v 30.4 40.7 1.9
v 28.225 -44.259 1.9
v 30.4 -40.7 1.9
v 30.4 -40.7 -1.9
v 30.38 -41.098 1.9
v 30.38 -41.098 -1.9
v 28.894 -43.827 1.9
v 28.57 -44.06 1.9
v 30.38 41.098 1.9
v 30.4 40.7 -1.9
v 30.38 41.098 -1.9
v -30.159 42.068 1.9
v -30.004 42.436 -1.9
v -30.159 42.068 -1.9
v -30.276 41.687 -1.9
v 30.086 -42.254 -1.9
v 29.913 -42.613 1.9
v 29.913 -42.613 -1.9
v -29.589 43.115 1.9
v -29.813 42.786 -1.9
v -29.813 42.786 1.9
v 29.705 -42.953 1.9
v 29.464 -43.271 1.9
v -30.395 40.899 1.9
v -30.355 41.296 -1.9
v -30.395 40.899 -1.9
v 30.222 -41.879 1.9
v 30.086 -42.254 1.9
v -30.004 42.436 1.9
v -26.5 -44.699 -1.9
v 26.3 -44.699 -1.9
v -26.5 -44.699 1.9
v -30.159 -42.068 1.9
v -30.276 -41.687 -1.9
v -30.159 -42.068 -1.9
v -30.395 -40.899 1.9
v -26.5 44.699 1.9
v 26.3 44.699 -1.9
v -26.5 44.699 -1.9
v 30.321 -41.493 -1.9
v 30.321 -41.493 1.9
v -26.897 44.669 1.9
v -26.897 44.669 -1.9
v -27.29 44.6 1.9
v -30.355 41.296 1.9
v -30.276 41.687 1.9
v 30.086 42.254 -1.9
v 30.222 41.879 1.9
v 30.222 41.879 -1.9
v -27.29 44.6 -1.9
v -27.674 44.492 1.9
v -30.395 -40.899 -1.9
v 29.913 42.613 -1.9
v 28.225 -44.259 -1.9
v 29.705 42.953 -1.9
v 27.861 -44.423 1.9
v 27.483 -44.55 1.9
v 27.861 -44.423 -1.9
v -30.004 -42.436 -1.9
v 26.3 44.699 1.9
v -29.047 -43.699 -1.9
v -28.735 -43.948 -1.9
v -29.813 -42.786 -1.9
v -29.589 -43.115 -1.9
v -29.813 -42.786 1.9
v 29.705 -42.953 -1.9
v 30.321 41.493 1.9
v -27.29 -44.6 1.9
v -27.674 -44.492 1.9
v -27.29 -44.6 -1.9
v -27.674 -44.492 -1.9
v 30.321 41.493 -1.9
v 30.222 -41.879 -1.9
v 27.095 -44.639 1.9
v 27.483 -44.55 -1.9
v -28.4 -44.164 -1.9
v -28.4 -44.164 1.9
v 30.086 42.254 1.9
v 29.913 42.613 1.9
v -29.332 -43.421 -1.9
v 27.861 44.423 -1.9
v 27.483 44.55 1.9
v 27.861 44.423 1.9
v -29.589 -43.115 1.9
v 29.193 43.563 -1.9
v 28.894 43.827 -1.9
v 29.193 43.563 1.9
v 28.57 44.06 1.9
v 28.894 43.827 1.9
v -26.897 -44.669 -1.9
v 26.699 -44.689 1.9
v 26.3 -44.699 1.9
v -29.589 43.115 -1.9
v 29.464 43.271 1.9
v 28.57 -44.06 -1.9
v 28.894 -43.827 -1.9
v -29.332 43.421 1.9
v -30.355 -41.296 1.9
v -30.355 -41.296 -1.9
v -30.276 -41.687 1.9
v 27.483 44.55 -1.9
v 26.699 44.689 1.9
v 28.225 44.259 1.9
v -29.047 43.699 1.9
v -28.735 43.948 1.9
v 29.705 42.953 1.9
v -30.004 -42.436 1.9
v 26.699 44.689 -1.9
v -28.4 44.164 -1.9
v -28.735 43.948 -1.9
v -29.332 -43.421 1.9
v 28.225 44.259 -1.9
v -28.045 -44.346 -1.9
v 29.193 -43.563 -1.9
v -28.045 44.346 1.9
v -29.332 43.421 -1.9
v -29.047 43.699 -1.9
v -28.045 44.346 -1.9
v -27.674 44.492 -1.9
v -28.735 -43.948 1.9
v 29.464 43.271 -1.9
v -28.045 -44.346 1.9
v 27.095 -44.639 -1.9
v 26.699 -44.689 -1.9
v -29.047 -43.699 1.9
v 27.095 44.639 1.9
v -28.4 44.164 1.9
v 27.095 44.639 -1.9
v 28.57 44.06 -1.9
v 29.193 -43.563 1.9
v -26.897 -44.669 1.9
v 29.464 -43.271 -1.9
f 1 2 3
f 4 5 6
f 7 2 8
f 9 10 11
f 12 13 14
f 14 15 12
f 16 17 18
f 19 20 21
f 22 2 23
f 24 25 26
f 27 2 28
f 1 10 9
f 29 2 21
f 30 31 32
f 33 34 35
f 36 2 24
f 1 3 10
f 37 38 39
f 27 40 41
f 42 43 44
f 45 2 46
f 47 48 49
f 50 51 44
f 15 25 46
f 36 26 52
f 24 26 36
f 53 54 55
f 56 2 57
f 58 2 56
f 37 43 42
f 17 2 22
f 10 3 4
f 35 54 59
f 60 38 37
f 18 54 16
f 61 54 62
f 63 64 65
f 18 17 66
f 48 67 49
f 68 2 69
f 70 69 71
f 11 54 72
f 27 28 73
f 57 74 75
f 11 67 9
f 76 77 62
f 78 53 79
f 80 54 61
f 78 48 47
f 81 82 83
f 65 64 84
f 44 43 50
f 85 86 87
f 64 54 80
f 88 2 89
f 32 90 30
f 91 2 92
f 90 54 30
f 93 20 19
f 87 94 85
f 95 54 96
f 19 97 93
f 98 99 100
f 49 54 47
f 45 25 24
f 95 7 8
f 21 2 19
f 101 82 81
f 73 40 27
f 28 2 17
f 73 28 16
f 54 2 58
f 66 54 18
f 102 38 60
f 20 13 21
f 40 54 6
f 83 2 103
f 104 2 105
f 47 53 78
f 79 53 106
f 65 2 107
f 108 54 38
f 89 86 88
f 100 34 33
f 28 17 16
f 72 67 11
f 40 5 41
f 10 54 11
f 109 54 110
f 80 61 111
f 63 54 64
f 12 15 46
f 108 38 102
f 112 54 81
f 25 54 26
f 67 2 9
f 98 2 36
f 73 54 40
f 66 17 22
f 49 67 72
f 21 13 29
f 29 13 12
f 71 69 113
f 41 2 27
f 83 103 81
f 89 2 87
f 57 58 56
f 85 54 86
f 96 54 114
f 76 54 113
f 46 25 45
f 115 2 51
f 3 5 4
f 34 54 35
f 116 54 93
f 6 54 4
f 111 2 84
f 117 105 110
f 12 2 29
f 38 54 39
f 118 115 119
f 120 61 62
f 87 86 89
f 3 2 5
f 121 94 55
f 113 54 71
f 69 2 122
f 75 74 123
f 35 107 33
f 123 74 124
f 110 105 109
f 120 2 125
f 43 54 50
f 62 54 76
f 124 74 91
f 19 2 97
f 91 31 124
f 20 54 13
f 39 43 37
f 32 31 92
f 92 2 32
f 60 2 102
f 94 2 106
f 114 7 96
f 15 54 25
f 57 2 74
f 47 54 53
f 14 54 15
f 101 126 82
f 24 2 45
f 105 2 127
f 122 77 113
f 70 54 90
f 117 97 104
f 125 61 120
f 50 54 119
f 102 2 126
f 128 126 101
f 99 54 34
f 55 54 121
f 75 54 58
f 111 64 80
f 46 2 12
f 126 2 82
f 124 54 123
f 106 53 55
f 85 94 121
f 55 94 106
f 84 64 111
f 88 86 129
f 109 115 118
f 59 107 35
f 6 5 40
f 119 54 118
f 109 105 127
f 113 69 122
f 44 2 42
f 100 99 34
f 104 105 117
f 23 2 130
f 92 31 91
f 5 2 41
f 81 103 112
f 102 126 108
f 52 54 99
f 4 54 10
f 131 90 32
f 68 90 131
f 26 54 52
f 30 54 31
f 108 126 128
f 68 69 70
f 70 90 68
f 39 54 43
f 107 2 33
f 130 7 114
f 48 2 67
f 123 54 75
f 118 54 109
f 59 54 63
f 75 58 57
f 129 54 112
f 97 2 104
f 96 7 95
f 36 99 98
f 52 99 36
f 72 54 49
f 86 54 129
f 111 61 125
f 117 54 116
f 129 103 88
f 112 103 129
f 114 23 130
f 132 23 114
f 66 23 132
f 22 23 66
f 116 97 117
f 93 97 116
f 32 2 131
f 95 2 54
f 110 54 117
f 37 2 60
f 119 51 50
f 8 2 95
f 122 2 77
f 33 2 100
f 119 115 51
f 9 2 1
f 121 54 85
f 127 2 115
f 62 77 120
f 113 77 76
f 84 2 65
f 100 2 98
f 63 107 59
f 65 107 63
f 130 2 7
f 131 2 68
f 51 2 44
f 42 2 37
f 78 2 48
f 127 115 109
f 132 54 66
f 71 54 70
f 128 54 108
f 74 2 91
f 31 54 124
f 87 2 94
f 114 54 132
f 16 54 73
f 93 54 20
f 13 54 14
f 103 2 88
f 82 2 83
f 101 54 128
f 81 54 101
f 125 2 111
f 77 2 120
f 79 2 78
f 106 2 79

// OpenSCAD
// possible case dimensions
case_dims_35mk2 = [60.8, 89.4];
case_dims_3x4mk2 = [106.5, 133.2];

// select desired case dimensions
case_dims = case_dims_35mk2; 

// better resolution
$fa = 1;
$fs = 0.4;

// outside shape
outerx = case_dims[0];
outery = case_dims[1];
outerz = 3.8;


// radius for the curved corners 
curveradius = 4;

// define modules

module rounded_rect_prism(x, y, z, r1) {
    hull() {
        translate([x/2 - r1, y/2 - r1, 0])
            cylinder(z, r1, r1, center = true);
        translate([-x/2 + r1, y/2 - r1, 0])
            cylinder(z, r1, r1, center = true);
        translate([-x/2 + r1, -y/2 + r1, 0])
            cylinder(z, r1, r1, center = true);
        translate([x/2 - r1, -y/2 + r1, 0])
            cylinder(z, r1, r1, center = true);
    }
}


rounded_rect_prism(outerx, outery, outerz, curveradius);
